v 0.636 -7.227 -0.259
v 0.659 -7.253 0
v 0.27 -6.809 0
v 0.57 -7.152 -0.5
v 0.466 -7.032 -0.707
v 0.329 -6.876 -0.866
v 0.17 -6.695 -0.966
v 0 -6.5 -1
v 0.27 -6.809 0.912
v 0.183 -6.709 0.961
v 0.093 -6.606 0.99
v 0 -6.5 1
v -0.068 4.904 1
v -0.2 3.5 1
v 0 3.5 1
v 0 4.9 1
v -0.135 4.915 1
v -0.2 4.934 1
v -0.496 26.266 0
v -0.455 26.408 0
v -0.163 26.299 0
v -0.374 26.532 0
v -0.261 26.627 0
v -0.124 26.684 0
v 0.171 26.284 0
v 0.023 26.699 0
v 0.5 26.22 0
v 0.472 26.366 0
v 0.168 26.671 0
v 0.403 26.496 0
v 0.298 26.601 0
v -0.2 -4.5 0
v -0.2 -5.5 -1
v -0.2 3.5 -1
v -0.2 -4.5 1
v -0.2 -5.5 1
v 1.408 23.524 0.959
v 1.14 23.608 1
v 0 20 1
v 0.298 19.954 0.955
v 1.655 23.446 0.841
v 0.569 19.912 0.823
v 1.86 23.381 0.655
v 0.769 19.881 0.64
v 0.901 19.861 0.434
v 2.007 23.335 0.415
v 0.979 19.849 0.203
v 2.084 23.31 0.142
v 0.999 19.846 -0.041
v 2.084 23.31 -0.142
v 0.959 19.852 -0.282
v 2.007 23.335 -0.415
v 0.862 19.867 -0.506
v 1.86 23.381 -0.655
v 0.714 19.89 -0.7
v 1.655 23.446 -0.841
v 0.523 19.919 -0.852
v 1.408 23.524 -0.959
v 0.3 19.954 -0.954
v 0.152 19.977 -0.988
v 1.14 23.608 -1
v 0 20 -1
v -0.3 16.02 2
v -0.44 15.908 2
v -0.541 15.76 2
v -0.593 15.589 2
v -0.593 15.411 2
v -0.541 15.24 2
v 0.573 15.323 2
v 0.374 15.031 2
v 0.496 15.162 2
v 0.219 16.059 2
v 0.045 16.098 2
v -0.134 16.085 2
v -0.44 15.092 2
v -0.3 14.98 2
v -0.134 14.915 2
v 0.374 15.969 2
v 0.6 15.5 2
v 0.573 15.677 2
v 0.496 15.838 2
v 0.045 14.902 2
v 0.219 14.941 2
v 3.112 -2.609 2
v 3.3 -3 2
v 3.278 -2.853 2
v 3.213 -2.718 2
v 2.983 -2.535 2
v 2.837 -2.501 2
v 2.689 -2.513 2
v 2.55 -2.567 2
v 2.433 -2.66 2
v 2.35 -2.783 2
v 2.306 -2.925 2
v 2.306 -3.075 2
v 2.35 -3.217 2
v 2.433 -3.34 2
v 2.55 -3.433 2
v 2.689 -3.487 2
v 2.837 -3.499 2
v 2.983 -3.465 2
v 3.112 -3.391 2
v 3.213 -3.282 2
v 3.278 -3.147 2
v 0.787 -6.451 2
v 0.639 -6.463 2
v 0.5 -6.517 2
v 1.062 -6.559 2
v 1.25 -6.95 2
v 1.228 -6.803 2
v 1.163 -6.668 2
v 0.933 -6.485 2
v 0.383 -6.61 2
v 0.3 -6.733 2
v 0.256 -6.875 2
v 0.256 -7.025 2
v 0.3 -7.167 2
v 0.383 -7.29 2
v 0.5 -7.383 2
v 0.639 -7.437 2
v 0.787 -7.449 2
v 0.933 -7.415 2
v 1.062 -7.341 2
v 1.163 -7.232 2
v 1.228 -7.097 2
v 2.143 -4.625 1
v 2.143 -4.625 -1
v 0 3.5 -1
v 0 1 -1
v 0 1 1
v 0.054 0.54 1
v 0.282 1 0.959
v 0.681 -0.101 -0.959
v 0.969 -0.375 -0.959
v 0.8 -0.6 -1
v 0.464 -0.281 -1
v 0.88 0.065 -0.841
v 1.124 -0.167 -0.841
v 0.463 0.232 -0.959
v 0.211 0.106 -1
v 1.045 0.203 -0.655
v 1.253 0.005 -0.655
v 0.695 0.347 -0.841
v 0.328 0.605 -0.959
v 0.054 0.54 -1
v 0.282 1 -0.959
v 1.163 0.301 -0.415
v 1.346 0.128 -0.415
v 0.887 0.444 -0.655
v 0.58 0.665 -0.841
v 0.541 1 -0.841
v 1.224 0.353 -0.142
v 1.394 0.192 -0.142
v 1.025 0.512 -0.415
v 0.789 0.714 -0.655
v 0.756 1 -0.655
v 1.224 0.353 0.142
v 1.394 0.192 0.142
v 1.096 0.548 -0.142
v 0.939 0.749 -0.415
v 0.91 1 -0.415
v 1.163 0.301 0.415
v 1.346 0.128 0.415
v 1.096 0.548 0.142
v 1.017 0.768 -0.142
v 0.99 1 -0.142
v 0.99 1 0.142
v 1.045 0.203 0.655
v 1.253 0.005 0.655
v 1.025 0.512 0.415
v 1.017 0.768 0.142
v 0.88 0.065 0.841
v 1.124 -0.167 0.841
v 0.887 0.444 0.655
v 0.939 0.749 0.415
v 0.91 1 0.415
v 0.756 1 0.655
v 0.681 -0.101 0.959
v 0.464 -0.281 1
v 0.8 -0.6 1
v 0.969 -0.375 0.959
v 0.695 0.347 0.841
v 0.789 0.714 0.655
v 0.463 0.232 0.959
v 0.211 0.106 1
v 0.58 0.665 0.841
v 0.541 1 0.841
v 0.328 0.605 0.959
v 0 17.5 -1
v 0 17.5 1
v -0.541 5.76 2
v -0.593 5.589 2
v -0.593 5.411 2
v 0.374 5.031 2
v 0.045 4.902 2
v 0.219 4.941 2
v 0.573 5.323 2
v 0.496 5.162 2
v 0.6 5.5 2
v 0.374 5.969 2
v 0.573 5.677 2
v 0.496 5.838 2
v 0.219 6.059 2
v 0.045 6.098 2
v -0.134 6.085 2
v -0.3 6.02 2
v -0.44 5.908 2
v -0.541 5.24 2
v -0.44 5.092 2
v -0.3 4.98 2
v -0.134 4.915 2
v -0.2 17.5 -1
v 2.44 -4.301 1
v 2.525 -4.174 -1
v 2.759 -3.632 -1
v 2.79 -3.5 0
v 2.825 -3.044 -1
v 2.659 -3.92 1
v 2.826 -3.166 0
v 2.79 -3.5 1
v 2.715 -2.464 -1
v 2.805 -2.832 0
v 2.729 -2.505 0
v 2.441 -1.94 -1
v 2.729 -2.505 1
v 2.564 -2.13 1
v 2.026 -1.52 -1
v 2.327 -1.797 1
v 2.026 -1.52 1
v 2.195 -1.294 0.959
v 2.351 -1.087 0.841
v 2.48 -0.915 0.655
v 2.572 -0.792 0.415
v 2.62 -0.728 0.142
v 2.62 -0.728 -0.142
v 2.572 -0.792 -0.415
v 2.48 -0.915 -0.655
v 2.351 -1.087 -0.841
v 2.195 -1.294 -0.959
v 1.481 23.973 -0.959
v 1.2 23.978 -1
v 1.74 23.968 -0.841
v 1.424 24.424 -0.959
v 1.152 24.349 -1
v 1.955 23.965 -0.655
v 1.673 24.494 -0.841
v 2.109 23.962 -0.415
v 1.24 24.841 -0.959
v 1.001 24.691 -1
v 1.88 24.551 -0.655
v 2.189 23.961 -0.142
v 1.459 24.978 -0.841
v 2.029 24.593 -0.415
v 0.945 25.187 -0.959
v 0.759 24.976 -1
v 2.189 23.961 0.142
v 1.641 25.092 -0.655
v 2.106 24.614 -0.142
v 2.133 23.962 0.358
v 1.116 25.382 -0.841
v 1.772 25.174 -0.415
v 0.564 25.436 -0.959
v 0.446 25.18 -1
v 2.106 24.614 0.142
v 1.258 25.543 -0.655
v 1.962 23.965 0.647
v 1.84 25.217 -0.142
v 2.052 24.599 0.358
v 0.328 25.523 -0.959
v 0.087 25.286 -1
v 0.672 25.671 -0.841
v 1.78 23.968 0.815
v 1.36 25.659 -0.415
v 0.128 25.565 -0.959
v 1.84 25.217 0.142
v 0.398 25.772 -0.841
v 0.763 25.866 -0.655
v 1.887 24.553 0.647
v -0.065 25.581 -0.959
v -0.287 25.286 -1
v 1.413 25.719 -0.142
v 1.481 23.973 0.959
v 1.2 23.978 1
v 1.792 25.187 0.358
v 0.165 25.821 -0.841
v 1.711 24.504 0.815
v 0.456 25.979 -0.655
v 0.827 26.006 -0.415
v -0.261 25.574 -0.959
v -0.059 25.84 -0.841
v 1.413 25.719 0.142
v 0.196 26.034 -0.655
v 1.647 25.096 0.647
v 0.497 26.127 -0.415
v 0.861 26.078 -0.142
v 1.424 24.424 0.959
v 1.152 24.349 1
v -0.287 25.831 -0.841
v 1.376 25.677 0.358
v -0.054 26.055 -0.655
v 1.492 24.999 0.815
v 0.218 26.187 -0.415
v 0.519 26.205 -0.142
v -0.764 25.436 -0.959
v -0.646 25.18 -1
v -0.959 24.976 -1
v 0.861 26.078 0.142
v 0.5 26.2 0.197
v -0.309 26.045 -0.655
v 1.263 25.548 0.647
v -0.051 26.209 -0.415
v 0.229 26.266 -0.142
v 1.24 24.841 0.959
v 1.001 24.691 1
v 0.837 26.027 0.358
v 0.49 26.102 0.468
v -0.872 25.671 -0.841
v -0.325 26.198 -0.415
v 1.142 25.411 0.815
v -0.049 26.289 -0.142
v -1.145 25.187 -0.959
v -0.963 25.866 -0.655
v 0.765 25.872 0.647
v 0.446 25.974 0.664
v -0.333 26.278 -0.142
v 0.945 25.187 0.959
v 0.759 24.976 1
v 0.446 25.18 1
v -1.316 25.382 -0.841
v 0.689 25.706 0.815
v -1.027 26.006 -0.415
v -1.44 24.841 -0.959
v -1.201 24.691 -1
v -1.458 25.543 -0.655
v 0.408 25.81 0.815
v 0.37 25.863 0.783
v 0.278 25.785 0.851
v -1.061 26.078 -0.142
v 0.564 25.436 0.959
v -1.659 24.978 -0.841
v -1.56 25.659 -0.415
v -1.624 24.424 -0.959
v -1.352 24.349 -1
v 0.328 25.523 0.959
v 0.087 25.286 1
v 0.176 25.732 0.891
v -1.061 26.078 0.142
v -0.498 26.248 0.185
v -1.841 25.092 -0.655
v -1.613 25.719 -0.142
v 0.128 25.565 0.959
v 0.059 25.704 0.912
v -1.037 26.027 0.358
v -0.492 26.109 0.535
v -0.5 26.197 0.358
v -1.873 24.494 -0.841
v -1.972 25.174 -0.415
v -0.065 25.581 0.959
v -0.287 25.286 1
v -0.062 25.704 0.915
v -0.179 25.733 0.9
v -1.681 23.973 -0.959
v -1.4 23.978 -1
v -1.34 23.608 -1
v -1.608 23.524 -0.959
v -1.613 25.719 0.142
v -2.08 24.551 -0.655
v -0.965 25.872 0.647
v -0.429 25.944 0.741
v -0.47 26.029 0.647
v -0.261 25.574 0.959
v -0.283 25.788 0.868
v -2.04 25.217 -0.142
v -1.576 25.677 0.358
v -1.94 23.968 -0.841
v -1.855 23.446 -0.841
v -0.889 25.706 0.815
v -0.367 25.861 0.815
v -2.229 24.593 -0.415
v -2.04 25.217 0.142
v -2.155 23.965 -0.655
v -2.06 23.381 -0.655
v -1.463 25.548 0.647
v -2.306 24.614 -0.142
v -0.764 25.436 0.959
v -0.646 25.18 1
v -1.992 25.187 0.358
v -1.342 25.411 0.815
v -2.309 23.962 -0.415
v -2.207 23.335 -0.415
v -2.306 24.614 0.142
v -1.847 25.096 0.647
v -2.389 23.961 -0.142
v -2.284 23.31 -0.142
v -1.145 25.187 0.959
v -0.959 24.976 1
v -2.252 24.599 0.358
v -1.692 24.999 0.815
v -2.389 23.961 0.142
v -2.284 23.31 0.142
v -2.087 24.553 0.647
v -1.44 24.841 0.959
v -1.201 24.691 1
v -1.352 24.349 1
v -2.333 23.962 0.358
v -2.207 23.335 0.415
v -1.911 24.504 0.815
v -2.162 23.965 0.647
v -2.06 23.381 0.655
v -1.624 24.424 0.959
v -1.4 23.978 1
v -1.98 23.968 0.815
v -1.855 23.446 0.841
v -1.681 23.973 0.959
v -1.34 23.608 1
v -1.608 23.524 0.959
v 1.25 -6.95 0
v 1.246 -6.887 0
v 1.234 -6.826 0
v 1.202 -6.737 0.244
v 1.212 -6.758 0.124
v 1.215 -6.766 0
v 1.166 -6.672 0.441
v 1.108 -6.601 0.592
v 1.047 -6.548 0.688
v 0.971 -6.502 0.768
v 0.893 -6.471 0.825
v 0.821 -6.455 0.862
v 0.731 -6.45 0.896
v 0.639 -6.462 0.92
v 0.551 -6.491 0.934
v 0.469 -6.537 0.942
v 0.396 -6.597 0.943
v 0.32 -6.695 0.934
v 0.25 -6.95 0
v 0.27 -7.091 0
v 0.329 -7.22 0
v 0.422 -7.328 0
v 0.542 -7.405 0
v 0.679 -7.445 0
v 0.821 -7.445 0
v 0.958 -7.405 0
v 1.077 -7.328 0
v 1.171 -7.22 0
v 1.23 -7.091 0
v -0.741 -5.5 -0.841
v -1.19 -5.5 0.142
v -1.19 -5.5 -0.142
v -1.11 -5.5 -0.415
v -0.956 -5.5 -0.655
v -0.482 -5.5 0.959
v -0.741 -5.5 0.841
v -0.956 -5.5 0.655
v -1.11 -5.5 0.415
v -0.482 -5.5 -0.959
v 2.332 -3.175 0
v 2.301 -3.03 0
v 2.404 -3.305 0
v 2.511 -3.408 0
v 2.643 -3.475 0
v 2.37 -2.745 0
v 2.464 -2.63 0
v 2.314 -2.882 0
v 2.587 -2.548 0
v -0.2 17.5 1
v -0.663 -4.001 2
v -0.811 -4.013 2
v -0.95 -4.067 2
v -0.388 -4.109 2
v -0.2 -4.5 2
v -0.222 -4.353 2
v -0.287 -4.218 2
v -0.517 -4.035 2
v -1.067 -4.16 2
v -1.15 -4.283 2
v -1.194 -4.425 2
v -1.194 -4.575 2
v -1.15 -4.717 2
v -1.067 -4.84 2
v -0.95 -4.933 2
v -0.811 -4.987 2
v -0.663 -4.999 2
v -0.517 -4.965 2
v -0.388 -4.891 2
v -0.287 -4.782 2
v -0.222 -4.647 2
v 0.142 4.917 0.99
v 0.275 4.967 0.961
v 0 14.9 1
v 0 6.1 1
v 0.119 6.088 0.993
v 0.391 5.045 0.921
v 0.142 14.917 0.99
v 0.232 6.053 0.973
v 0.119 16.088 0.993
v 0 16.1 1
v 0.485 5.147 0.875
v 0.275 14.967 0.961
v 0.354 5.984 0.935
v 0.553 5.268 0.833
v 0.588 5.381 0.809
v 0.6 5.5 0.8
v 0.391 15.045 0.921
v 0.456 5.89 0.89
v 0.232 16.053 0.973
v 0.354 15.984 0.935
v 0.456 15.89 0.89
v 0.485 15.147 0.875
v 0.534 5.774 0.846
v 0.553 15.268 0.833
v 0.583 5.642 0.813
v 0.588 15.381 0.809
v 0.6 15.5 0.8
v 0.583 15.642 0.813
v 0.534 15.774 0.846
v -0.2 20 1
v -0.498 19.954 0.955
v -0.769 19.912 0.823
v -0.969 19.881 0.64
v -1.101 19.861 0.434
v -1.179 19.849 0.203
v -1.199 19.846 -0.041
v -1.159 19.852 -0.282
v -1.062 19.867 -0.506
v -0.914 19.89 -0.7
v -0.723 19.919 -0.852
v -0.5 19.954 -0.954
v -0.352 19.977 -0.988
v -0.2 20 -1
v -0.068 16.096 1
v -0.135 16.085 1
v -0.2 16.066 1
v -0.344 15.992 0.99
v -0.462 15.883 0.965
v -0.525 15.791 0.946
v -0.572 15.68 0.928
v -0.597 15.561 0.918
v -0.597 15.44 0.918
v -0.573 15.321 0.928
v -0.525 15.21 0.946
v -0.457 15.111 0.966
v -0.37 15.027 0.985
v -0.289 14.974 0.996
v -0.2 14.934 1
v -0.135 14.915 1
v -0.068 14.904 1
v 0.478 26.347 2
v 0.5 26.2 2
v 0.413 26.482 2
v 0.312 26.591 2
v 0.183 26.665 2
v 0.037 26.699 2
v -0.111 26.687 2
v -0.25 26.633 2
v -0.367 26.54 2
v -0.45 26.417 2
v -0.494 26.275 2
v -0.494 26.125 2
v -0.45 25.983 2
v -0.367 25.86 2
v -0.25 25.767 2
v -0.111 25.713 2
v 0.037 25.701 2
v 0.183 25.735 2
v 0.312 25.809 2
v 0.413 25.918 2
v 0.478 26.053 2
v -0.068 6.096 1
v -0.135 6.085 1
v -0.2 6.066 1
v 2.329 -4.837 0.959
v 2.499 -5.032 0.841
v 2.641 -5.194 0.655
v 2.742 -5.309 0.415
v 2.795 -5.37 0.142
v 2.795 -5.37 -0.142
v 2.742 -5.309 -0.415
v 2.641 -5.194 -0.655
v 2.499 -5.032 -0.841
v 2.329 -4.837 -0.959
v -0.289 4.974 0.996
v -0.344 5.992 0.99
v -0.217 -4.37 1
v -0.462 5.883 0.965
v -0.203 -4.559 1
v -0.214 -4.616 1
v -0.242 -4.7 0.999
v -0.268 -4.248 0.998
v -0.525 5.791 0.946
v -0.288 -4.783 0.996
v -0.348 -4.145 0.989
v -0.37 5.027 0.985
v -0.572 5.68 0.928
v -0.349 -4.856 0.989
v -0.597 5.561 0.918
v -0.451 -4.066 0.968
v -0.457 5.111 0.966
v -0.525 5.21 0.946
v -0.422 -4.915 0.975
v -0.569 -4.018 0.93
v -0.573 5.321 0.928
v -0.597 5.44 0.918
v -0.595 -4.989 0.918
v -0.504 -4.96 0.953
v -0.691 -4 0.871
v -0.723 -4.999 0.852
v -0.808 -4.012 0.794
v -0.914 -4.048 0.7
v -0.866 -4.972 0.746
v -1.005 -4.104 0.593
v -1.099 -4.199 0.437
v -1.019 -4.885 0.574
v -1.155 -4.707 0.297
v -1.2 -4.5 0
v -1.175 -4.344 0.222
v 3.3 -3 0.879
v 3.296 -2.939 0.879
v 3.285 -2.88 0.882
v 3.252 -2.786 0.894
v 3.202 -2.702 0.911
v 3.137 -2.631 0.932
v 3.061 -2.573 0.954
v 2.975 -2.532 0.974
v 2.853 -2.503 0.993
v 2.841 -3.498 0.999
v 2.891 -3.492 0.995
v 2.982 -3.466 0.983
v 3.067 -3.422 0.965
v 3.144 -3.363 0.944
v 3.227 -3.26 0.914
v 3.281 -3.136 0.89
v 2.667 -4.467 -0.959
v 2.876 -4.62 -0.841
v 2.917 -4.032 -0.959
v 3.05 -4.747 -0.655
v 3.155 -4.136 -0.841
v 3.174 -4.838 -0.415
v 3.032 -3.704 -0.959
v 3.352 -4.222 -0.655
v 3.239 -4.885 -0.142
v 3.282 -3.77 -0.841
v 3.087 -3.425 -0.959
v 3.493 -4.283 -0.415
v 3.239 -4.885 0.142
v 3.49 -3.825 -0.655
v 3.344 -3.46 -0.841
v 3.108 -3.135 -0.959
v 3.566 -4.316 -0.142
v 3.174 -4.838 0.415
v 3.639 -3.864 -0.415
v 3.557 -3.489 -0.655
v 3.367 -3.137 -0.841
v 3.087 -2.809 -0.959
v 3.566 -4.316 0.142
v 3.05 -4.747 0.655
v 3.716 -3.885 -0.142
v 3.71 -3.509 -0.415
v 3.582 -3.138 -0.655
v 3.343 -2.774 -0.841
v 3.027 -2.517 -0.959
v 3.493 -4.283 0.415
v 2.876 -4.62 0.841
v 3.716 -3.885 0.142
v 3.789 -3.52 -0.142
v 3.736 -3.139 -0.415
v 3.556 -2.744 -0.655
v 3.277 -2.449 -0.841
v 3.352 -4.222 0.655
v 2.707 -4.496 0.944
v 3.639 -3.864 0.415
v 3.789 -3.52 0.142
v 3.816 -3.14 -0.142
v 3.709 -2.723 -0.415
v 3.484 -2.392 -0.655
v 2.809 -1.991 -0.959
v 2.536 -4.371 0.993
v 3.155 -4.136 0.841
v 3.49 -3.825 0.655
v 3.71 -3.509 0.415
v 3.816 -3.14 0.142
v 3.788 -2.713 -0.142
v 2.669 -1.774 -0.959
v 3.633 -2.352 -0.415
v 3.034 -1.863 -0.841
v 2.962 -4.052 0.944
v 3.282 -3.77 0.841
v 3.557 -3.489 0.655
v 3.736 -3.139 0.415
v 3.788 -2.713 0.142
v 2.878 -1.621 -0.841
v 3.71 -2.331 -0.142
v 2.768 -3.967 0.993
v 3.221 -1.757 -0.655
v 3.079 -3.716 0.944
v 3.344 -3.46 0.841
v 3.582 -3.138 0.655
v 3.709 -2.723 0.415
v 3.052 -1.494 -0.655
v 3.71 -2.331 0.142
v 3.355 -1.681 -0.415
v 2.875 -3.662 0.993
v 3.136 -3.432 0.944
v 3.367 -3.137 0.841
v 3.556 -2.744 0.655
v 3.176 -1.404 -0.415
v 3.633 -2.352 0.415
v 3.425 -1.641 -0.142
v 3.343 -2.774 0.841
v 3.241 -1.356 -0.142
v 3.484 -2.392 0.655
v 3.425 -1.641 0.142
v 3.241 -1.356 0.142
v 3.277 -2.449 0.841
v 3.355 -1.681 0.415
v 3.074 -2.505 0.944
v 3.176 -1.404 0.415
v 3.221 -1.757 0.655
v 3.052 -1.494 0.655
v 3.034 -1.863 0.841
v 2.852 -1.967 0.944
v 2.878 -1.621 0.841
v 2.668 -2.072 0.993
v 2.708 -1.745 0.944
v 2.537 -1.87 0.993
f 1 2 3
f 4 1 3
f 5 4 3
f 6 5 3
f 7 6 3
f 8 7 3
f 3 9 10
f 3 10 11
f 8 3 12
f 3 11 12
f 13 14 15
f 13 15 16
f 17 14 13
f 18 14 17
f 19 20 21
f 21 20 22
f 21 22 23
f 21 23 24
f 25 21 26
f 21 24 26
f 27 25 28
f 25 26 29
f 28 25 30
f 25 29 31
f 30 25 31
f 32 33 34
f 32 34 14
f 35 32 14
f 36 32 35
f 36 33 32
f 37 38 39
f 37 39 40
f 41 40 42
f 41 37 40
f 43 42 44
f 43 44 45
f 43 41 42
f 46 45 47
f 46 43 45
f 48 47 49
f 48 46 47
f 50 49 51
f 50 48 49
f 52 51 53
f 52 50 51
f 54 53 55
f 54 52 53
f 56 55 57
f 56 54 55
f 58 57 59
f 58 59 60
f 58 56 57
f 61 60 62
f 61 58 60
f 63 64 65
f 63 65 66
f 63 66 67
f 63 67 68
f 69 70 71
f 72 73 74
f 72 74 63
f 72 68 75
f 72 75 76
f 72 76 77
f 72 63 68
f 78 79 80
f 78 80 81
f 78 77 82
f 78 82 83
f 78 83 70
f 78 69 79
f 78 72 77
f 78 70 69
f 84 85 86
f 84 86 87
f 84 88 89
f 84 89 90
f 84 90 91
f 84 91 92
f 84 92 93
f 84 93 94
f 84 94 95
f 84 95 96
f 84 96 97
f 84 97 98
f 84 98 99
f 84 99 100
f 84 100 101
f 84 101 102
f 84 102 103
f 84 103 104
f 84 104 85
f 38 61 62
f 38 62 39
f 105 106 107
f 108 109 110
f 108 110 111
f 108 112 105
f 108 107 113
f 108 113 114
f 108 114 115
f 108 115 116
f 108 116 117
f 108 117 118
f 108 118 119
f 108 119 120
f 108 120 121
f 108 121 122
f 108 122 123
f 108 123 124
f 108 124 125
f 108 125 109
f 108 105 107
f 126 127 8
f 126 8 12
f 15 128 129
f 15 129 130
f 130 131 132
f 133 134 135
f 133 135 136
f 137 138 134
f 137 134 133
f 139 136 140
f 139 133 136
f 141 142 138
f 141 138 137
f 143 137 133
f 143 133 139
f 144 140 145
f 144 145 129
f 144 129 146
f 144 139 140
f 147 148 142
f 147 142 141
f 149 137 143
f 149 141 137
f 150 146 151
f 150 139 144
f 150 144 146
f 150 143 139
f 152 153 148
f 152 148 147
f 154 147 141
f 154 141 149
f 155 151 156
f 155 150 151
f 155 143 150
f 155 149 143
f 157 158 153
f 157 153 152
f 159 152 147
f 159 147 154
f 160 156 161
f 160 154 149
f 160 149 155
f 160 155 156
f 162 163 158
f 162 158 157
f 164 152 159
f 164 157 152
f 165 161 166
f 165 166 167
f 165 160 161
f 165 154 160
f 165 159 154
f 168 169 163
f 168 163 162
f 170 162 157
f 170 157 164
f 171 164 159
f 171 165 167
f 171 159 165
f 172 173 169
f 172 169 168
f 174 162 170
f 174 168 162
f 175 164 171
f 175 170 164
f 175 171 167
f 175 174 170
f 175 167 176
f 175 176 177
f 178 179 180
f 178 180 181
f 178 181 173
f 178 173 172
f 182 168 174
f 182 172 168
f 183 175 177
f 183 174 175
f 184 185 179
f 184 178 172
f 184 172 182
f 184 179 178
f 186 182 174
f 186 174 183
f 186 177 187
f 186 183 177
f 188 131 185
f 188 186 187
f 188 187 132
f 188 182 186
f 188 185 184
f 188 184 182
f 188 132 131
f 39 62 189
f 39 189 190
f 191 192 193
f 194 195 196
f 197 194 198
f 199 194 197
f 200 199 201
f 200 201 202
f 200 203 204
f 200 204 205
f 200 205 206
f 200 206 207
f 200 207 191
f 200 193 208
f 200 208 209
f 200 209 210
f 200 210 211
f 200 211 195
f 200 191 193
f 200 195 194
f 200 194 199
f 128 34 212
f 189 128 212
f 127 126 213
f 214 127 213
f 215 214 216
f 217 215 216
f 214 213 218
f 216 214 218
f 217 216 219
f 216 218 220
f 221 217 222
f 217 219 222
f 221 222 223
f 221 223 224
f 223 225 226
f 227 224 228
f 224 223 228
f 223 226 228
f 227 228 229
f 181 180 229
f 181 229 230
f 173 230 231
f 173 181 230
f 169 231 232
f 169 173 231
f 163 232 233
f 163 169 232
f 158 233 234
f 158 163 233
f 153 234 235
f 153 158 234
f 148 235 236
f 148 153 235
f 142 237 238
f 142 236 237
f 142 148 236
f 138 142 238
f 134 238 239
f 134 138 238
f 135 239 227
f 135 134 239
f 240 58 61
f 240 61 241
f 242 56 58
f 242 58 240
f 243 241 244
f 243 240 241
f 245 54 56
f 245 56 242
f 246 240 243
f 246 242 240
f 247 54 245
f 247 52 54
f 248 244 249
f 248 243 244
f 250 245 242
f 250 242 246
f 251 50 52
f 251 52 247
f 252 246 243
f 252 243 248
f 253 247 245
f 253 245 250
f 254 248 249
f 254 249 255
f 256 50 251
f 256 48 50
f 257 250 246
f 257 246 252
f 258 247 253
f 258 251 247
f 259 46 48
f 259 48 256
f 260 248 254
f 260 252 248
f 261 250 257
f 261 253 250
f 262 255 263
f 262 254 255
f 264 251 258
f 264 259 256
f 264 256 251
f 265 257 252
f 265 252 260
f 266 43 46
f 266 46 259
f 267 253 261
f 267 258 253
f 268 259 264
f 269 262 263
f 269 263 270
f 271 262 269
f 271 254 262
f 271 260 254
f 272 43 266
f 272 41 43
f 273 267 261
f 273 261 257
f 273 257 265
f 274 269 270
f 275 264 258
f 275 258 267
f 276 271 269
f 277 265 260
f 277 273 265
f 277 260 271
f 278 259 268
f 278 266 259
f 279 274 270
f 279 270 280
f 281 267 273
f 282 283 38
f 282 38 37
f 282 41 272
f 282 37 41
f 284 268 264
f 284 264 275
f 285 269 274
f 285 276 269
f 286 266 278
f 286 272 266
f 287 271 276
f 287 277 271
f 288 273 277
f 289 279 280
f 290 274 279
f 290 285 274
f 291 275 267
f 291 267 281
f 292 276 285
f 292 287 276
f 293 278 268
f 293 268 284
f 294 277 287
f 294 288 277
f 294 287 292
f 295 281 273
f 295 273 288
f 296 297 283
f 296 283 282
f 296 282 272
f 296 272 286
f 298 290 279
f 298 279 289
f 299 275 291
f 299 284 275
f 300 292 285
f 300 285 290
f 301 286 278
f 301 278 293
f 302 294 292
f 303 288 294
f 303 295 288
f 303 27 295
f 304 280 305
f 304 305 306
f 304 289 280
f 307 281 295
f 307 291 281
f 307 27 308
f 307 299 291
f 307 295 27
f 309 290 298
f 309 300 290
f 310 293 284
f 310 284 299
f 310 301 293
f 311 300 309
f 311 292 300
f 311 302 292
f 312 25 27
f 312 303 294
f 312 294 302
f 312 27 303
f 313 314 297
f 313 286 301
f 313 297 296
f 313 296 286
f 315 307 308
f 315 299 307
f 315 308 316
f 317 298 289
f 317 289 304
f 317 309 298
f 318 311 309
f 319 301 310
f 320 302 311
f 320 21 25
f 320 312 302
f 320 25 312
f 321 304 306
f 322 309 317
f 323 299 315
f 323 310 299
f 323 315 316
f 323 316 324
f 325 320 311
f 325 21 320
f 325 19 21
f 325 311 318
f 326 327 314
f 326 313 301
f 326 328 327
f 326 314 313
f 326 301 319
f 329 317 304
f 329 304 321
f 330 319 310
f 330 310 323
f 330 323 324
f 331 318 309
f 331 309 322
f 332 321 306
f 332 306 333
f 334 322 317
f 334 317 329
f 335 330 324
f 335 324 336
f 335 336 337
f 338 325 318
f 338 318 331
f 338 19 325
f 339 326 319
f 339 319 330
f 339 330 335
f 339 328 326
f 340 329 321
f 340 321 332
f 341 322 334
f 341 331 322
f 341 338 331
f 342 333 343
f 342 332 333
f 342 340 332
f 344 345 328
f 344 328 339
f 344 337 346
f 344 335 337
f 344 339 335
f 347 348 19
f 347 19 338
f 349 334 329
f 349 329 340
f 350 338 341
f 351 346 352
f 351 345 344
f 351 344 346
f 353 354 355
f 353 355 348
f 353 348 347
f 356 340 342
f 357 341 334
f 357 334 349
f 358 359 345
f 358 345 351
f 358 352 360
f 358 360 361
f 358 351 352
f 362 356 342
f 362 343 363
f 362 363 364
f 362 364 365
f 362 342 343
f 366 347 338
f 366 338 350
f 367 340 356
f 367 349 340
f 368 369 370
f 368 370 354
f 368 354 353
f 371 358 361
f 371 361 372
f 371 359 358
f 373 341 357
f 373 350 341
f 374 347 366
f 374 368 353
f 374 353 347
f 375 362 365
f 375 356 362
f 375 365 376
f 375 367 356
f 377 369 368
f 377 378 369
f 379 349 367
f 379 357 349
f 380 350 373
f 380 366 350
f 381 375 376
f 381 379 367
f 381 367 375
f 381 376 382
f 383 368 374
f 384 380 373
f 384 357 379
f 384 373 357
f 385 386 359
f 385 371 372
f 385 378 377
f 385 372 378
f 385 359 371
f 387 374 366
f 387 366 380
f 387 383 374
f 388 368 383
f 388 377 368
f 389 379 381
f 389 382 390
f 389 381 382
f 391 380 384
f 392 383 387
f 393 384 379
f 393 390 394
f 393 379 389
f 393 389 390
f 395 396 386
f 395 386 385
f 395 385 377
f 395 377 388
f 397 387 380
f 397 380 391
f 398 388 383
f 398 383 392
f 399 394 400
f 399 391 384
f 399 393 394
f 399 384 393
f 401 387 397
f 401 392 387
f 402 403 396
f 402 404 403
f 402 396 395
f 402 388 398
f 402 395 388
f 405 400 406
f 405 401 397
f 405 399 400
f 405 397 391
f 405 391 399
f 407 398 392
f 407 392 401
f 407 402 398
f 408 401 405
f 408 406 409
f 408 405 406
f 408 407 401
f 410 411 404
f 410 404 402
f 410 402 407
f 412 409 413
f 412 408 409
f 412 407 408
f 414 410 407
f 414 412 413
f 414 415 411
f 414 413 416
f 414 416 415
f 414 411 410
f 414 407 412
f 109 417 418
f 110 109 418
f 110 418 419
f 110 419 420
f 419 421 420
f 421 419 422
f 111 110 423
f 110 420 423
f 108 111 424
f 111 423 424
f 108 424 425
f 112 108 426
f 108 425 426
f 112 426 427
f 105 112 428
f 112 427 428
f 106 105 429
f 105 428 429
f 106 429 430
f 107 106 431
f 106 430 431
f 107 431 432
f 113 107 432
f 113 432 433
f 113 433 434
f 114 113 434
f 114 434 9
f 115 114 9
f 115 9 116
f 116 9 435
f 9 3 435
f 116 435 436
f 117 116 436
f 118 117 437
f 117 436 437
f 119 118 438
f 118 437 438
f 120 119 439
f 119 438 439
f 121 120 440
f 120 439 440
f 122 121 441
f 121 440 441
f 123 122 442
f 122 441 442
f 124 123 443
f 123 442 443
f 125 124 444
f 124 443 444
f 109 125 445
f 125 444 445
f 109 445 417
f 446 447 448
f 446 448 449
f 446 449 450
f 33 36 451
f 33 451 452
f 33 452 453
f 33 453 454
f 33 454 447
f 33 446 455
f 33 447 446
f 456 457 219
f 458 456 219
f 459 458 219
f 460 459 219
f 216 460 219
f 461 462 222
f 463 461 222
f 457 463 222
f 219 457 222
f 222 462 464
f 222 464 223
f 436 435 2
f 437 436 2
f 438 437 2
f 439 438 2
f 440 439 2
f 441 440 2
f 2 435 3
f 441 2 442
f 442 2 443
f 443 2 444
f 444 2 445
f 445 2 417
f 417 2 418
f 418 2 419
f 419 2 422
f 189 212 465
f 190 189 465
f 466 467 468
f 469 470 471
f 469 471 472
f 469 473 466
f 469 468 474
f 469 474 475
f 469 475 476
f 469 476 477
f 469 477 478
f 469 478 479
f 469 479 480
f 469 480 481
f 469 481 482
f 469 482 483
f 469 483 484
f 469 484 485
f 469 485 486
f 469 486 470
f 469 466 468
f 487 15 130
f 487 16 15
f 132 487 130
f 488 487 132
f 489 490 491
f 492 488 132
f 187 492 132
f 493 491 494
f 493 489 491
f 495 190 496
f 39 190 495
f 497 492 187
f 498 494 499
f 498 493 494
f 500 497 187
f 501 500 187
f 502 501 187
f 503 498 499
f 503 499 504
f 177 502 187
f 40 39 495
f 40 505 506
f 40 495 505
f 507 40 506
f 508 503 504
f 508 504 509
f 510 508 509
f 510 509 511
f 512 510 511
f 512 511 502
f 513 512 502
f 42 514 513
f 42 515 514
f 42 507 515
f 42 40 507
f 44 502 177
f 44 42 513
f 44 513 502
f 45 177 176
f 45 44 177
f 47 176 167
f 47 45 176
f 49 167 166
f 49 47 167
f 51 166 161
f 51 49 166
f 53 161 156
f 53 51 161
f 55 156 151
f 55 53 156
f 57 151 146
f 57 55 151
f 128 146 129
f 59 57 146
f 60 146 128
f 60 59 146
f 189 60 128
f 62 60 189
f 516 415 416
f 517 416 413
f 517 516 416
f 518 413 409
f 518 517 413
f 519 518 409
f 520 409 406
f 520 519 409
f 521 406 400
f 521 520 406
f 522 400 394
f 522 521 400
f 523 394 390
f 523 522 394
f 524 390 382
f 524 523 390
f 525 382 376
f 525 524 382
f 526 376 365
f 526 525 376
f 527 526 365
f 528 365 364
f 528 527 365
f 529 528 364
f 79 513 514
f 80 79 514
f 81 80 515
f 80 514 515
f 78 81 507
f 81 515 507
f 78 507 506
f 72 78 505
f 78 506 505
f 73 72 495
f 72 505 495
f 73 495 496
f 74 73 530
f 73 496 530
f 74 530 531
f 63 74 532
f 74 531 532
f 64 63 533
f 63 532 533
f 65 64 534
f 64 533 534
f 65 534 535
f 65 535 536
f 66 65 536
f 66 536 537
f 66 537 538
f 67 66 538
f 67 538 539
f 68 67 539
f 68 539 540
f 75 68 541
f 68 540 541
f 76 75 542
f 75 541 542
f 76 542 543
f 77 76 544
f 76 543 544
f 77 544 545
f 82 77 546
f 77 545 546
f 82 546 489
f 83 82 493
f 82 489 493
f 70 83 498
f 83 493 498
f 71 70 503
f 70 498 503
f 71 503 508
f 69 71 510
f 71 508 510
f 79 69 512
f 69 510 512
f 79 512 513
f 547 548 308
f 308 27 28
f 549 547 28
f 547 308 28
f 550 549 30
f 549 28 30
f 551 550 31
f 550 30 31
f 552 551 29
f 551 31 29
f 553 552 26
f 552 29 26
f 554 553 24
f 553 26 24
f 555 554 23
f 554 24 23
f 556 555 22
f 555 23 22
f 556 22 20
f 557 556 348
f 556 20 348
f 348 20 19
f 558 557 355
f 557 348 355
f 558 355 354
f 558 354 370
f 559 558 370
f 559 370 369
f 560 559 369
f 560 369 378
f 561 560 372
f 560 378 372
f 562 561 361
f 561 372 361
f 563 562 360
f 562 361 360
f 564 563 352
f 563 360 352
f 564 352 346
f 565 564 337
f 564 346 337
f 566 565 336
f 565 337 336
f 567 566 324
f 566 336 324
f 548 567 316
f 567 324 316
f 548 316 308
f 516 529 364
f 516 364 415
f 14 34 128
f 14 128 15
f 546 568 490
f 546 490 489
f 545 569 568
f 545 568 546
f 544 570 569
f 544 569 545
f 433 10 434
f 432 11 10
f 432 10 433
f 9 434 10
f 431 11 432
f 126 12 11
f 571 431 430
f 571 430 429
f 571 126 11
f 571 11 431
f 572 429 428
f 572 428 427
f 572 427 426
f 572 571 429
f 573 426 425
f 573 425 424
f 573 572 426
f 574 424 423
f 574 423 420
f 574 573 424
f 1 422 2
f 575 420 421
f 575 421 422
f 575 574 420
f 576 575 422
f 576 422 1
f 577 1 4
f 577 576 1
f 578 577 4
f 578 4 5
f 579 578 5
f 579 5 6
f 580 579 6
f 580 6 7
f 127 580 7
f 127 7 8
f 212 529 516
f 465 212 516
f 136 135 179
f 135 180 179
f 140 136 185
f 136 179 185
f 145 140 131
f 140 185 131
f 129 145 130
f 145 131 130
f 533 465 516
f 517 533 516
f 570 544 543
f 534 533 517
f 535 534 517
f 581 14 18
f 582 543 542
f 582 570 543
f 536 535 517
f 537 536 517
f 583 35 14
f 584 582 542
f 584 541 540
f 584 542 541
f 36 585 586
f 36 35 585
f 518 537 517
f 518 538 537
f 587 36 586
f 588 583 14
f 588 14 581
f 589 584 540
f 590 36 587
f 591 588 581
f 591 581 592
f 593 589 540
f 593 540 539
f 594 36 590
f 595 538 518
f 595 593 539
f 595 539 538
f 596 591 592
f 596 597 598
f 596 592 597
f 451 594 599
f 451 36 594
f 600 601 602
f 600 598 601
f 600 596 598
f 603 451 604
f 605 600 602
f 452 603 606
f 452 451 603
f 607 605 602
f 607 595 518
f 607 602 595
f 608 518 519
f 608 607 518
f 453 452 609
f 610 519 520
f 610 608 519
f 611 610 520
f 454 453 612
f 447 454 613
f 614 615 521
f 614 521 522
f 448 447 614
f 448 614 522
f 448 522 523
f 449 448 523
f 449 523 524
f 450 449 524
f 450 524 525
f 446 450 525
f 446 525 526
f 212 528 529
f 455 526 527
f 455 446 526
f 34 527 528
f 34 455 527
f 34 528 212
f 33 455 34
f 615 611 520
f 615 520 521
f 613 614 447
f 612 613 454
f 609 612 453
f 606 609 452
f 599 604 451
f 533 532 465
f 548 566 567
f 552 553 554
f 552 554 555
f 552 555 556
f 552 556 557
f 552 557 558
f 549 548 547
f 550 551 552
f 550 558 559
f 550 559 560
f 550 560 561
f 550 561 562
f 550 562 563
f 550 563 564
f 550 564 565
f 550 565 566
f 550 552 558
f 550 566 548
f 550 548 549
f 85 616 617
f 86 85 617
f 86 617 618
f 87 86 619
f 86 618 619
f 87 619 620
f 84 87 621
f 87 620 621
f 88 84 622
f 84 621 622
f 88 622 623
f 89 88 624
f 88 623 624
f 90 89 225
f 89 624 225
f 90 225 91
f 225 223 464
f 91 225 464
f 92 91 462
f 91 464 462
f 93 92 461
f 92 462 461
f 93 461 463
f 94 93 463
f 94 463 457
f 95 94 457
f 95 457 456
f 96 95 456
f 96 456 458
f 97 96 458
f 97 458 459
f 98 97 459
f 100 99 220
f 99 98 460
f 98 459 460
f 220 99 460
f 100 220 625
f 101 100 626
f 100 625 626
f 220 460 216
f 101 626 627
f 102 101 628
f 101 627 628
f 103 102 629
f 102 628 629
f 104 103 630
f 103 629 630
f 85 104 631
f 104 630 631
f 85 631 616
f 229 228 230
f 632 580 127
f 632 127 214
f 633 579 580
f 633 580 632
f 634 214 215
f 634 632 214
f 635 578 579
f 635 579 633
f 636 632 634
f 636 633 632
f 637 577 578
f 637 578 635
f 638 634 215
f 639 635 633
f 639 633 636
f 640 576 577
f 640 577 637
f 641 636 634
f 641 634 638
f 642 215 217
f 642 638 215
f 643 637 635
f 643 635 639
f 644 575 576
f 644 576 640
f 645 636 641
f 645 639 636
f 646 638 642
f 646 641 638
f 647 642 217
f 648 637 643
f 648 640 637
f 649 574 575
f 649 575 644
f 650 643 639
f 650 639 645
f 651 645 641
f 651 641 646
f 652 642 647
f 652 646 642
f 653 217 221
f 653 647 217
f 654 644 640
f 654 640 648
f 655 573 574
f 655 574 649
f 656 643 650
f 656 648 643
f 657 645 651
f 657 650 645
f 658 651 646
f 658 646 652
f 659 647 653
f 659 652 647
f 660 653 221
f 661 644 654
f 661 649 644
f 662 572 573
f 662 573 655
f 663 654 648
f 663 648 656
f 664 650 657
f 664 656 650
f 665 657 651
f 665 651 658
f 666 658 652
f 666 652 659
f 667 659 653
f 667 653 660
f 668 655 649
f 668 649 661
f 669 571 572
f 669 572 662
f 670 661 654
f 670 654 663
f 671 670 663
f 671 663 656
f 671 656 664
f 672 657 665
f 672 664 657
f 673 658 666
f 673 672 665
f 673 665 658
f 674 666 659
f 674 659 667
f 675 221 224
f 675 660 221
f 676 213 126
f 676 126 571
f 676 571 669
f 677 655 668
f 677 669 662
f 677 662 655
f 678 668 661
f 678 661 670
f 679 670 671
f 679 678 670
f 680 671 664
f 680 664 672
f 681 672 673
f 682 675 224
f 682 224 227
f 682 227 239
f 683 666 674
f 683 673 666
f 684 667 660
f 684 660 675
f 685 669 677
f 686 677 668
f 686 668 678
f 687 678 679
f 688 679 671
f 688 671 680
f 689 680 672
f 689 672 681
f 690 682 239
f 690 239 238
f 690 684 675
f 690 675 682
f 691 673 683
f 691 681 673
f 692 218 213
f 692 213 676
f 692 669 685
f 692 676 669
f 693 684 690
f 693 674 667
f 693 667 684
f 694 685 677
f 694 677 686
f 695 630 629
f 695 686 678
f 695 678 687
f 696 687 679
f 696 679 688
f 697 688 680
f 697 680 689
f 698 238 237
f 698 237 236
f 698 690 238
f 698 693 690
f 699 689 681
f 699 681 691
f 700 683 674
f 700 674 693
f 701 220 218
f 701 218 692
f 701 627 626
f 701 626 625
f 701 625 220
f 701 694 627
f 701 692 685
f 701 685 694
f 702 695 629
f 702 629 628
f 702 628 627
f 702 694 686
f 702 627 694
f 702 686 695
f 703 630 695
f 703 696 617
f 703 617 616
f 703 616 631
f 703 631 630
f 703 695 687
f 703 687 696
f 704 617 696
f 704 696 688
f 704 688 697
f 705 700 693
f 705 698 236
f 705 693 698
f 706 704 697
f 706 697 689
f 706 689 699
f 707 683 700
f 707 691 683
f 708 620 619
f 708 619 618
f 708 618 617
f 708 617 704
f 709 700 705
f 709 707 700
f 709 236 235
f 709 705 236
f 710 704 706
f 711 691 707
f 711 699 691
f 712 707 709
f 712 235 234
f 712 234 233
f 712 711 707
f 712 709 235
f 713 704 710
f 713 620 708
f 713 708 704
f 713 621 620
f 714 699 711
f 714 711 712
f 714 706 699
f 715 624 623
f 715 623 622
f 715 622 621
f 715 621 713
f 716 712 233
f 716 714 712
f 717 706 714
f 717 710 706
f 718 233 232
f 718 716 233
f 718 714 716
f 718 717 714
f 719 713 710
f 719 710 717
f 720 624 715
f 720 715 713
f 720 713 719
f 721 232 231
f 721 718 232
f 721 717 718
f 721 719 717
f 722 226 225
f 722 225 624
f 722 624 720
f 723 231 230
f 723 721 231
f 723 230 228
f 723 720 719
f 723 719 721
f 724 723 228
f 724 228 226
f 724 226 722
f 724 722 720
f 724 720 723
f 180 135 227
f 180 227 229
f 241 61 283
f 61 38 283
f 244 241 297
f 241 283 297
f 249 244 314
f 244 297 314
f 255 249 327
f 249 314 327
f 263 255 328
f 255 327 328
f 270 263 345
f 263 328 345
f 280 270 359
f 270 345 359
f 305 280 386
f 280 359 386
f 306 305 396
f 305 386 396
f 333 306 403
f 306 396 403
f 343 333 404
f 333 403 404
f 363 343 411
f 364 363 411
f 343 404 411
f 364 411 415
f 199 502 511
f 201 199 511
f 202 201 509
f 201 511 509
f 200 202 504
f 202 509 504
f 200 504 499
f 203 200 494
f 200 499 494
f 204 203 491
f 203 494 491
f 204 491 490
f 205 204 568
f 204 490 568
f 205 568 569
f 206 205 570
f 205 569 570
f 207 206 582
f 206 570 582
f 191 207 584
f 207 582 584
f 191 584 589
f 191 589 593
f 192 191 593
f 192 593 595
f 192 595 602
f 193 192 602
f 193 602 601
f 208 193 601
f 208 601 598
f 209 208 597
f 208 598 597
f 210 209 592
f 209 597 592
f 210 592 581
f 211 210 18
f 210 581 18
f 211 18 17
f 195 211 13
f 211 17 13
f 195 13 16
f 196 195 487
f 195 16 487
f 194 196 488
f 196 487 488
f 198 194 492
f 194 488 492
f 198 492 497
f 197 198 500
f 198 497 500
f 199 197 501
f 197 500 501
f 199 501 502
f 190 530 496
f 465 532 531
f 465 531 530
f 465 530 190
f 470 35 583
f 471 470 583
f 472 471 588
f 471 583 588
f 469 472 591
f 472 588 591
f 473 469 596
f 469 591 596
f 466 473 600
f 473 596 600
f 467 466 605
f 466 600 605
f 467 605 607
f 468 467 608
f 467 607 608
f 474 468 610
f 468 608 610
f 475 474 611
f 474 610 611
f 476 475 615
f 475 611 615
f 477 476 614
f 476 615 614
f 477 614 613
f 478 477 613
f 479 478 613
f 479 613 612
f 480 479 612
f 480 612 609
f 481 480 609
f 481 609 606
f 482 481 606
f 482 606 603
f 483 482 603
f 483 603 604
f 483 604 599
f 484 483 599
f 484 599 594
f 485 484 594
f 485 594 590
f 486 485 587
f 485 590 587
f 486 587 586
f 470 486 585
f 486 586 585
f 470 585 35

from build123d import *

# Parameters (mm, degrees)
F4_W     = 14
F4_H     = 2
F5_DEPTH = 0.2
F6_R     = 0.6
F6_R_2   = 0.5
F7_DEPTH = 2


with BuildPart() as f3:
    # F3: sweep along a path in F0
    with BuildLine(Plane.XY) as f3_path:
        Line((0, -6.5), (2.1431406292, -4.6247519495))
        ThreePointArc((2.1431406292, -4.6247519495), (2.8247129707, -3.0442874784), (2.0261314134, -1.5195985601))
        Line((2.0261314134, -1.5195985601), (0.8, -0.6))
        ThreePointArc((0.8, -0.6), (0.211145618, 0.105572809), (0, 1))
        Line((0, 1), (0, 20))
        Line((0, 20), (1.1396454369, 23.6084911359))
        ThreePointArc((1.1396454369, 23.6084911359), (-0.1, 25.3), (-1.3396454369, 23.6084911359))
        Line((-1.3396454369, 23.6084911359), (-0.2, 20))
        Line((-0.2, 20), (-0.2, 0))
        Line((-0.2, 0), (-0.2, -5.5))
    # F2 (on plane+point) → F3 (sweep)
    with BuildSketch(Plane.XZ.offset(5.5)):
        with BuildLine():
            Line((-0.2, 0), (-0.2, 1))
            ThreePointArc((-0.2, 1), (-1.2, 0), (-0.2, -1))
            Line((-0.2, -1), (-0.2, 0))
        make_face()
    sweep(path=f3_path.line, transition=Transition.RIGHT)

    # F4 (on face) → F5 (join, through all)
    with BuildSketch(Plane.YZ.offset(-0.2)):
        with Locations((10.5, 0)):
            Rectangle(F4_W, F4_H)
    extrude(amount=F5_DEPTH)

    # F6 (on Top) → F7 (join)
    with BuildSketch(Plane.XY):
        with Locations((0, 15.5)):
            Circle(F6_R)
        with Locations((0, 5.5)):
            Circle(F6_R)
        with Locations((0, 26.2)):
            Circle(F6_R_2)
        with Locations((2.8, -3)):
            Circle(F6_R_2)
        with Locations((-0.7, -4.5)):
            Circle(F6_R_2)
        with Locations((0.75, -6.95)):
            Circle(F6_R_2)
    extrude(amount=F7_DEPTH)


solid = f3.part
